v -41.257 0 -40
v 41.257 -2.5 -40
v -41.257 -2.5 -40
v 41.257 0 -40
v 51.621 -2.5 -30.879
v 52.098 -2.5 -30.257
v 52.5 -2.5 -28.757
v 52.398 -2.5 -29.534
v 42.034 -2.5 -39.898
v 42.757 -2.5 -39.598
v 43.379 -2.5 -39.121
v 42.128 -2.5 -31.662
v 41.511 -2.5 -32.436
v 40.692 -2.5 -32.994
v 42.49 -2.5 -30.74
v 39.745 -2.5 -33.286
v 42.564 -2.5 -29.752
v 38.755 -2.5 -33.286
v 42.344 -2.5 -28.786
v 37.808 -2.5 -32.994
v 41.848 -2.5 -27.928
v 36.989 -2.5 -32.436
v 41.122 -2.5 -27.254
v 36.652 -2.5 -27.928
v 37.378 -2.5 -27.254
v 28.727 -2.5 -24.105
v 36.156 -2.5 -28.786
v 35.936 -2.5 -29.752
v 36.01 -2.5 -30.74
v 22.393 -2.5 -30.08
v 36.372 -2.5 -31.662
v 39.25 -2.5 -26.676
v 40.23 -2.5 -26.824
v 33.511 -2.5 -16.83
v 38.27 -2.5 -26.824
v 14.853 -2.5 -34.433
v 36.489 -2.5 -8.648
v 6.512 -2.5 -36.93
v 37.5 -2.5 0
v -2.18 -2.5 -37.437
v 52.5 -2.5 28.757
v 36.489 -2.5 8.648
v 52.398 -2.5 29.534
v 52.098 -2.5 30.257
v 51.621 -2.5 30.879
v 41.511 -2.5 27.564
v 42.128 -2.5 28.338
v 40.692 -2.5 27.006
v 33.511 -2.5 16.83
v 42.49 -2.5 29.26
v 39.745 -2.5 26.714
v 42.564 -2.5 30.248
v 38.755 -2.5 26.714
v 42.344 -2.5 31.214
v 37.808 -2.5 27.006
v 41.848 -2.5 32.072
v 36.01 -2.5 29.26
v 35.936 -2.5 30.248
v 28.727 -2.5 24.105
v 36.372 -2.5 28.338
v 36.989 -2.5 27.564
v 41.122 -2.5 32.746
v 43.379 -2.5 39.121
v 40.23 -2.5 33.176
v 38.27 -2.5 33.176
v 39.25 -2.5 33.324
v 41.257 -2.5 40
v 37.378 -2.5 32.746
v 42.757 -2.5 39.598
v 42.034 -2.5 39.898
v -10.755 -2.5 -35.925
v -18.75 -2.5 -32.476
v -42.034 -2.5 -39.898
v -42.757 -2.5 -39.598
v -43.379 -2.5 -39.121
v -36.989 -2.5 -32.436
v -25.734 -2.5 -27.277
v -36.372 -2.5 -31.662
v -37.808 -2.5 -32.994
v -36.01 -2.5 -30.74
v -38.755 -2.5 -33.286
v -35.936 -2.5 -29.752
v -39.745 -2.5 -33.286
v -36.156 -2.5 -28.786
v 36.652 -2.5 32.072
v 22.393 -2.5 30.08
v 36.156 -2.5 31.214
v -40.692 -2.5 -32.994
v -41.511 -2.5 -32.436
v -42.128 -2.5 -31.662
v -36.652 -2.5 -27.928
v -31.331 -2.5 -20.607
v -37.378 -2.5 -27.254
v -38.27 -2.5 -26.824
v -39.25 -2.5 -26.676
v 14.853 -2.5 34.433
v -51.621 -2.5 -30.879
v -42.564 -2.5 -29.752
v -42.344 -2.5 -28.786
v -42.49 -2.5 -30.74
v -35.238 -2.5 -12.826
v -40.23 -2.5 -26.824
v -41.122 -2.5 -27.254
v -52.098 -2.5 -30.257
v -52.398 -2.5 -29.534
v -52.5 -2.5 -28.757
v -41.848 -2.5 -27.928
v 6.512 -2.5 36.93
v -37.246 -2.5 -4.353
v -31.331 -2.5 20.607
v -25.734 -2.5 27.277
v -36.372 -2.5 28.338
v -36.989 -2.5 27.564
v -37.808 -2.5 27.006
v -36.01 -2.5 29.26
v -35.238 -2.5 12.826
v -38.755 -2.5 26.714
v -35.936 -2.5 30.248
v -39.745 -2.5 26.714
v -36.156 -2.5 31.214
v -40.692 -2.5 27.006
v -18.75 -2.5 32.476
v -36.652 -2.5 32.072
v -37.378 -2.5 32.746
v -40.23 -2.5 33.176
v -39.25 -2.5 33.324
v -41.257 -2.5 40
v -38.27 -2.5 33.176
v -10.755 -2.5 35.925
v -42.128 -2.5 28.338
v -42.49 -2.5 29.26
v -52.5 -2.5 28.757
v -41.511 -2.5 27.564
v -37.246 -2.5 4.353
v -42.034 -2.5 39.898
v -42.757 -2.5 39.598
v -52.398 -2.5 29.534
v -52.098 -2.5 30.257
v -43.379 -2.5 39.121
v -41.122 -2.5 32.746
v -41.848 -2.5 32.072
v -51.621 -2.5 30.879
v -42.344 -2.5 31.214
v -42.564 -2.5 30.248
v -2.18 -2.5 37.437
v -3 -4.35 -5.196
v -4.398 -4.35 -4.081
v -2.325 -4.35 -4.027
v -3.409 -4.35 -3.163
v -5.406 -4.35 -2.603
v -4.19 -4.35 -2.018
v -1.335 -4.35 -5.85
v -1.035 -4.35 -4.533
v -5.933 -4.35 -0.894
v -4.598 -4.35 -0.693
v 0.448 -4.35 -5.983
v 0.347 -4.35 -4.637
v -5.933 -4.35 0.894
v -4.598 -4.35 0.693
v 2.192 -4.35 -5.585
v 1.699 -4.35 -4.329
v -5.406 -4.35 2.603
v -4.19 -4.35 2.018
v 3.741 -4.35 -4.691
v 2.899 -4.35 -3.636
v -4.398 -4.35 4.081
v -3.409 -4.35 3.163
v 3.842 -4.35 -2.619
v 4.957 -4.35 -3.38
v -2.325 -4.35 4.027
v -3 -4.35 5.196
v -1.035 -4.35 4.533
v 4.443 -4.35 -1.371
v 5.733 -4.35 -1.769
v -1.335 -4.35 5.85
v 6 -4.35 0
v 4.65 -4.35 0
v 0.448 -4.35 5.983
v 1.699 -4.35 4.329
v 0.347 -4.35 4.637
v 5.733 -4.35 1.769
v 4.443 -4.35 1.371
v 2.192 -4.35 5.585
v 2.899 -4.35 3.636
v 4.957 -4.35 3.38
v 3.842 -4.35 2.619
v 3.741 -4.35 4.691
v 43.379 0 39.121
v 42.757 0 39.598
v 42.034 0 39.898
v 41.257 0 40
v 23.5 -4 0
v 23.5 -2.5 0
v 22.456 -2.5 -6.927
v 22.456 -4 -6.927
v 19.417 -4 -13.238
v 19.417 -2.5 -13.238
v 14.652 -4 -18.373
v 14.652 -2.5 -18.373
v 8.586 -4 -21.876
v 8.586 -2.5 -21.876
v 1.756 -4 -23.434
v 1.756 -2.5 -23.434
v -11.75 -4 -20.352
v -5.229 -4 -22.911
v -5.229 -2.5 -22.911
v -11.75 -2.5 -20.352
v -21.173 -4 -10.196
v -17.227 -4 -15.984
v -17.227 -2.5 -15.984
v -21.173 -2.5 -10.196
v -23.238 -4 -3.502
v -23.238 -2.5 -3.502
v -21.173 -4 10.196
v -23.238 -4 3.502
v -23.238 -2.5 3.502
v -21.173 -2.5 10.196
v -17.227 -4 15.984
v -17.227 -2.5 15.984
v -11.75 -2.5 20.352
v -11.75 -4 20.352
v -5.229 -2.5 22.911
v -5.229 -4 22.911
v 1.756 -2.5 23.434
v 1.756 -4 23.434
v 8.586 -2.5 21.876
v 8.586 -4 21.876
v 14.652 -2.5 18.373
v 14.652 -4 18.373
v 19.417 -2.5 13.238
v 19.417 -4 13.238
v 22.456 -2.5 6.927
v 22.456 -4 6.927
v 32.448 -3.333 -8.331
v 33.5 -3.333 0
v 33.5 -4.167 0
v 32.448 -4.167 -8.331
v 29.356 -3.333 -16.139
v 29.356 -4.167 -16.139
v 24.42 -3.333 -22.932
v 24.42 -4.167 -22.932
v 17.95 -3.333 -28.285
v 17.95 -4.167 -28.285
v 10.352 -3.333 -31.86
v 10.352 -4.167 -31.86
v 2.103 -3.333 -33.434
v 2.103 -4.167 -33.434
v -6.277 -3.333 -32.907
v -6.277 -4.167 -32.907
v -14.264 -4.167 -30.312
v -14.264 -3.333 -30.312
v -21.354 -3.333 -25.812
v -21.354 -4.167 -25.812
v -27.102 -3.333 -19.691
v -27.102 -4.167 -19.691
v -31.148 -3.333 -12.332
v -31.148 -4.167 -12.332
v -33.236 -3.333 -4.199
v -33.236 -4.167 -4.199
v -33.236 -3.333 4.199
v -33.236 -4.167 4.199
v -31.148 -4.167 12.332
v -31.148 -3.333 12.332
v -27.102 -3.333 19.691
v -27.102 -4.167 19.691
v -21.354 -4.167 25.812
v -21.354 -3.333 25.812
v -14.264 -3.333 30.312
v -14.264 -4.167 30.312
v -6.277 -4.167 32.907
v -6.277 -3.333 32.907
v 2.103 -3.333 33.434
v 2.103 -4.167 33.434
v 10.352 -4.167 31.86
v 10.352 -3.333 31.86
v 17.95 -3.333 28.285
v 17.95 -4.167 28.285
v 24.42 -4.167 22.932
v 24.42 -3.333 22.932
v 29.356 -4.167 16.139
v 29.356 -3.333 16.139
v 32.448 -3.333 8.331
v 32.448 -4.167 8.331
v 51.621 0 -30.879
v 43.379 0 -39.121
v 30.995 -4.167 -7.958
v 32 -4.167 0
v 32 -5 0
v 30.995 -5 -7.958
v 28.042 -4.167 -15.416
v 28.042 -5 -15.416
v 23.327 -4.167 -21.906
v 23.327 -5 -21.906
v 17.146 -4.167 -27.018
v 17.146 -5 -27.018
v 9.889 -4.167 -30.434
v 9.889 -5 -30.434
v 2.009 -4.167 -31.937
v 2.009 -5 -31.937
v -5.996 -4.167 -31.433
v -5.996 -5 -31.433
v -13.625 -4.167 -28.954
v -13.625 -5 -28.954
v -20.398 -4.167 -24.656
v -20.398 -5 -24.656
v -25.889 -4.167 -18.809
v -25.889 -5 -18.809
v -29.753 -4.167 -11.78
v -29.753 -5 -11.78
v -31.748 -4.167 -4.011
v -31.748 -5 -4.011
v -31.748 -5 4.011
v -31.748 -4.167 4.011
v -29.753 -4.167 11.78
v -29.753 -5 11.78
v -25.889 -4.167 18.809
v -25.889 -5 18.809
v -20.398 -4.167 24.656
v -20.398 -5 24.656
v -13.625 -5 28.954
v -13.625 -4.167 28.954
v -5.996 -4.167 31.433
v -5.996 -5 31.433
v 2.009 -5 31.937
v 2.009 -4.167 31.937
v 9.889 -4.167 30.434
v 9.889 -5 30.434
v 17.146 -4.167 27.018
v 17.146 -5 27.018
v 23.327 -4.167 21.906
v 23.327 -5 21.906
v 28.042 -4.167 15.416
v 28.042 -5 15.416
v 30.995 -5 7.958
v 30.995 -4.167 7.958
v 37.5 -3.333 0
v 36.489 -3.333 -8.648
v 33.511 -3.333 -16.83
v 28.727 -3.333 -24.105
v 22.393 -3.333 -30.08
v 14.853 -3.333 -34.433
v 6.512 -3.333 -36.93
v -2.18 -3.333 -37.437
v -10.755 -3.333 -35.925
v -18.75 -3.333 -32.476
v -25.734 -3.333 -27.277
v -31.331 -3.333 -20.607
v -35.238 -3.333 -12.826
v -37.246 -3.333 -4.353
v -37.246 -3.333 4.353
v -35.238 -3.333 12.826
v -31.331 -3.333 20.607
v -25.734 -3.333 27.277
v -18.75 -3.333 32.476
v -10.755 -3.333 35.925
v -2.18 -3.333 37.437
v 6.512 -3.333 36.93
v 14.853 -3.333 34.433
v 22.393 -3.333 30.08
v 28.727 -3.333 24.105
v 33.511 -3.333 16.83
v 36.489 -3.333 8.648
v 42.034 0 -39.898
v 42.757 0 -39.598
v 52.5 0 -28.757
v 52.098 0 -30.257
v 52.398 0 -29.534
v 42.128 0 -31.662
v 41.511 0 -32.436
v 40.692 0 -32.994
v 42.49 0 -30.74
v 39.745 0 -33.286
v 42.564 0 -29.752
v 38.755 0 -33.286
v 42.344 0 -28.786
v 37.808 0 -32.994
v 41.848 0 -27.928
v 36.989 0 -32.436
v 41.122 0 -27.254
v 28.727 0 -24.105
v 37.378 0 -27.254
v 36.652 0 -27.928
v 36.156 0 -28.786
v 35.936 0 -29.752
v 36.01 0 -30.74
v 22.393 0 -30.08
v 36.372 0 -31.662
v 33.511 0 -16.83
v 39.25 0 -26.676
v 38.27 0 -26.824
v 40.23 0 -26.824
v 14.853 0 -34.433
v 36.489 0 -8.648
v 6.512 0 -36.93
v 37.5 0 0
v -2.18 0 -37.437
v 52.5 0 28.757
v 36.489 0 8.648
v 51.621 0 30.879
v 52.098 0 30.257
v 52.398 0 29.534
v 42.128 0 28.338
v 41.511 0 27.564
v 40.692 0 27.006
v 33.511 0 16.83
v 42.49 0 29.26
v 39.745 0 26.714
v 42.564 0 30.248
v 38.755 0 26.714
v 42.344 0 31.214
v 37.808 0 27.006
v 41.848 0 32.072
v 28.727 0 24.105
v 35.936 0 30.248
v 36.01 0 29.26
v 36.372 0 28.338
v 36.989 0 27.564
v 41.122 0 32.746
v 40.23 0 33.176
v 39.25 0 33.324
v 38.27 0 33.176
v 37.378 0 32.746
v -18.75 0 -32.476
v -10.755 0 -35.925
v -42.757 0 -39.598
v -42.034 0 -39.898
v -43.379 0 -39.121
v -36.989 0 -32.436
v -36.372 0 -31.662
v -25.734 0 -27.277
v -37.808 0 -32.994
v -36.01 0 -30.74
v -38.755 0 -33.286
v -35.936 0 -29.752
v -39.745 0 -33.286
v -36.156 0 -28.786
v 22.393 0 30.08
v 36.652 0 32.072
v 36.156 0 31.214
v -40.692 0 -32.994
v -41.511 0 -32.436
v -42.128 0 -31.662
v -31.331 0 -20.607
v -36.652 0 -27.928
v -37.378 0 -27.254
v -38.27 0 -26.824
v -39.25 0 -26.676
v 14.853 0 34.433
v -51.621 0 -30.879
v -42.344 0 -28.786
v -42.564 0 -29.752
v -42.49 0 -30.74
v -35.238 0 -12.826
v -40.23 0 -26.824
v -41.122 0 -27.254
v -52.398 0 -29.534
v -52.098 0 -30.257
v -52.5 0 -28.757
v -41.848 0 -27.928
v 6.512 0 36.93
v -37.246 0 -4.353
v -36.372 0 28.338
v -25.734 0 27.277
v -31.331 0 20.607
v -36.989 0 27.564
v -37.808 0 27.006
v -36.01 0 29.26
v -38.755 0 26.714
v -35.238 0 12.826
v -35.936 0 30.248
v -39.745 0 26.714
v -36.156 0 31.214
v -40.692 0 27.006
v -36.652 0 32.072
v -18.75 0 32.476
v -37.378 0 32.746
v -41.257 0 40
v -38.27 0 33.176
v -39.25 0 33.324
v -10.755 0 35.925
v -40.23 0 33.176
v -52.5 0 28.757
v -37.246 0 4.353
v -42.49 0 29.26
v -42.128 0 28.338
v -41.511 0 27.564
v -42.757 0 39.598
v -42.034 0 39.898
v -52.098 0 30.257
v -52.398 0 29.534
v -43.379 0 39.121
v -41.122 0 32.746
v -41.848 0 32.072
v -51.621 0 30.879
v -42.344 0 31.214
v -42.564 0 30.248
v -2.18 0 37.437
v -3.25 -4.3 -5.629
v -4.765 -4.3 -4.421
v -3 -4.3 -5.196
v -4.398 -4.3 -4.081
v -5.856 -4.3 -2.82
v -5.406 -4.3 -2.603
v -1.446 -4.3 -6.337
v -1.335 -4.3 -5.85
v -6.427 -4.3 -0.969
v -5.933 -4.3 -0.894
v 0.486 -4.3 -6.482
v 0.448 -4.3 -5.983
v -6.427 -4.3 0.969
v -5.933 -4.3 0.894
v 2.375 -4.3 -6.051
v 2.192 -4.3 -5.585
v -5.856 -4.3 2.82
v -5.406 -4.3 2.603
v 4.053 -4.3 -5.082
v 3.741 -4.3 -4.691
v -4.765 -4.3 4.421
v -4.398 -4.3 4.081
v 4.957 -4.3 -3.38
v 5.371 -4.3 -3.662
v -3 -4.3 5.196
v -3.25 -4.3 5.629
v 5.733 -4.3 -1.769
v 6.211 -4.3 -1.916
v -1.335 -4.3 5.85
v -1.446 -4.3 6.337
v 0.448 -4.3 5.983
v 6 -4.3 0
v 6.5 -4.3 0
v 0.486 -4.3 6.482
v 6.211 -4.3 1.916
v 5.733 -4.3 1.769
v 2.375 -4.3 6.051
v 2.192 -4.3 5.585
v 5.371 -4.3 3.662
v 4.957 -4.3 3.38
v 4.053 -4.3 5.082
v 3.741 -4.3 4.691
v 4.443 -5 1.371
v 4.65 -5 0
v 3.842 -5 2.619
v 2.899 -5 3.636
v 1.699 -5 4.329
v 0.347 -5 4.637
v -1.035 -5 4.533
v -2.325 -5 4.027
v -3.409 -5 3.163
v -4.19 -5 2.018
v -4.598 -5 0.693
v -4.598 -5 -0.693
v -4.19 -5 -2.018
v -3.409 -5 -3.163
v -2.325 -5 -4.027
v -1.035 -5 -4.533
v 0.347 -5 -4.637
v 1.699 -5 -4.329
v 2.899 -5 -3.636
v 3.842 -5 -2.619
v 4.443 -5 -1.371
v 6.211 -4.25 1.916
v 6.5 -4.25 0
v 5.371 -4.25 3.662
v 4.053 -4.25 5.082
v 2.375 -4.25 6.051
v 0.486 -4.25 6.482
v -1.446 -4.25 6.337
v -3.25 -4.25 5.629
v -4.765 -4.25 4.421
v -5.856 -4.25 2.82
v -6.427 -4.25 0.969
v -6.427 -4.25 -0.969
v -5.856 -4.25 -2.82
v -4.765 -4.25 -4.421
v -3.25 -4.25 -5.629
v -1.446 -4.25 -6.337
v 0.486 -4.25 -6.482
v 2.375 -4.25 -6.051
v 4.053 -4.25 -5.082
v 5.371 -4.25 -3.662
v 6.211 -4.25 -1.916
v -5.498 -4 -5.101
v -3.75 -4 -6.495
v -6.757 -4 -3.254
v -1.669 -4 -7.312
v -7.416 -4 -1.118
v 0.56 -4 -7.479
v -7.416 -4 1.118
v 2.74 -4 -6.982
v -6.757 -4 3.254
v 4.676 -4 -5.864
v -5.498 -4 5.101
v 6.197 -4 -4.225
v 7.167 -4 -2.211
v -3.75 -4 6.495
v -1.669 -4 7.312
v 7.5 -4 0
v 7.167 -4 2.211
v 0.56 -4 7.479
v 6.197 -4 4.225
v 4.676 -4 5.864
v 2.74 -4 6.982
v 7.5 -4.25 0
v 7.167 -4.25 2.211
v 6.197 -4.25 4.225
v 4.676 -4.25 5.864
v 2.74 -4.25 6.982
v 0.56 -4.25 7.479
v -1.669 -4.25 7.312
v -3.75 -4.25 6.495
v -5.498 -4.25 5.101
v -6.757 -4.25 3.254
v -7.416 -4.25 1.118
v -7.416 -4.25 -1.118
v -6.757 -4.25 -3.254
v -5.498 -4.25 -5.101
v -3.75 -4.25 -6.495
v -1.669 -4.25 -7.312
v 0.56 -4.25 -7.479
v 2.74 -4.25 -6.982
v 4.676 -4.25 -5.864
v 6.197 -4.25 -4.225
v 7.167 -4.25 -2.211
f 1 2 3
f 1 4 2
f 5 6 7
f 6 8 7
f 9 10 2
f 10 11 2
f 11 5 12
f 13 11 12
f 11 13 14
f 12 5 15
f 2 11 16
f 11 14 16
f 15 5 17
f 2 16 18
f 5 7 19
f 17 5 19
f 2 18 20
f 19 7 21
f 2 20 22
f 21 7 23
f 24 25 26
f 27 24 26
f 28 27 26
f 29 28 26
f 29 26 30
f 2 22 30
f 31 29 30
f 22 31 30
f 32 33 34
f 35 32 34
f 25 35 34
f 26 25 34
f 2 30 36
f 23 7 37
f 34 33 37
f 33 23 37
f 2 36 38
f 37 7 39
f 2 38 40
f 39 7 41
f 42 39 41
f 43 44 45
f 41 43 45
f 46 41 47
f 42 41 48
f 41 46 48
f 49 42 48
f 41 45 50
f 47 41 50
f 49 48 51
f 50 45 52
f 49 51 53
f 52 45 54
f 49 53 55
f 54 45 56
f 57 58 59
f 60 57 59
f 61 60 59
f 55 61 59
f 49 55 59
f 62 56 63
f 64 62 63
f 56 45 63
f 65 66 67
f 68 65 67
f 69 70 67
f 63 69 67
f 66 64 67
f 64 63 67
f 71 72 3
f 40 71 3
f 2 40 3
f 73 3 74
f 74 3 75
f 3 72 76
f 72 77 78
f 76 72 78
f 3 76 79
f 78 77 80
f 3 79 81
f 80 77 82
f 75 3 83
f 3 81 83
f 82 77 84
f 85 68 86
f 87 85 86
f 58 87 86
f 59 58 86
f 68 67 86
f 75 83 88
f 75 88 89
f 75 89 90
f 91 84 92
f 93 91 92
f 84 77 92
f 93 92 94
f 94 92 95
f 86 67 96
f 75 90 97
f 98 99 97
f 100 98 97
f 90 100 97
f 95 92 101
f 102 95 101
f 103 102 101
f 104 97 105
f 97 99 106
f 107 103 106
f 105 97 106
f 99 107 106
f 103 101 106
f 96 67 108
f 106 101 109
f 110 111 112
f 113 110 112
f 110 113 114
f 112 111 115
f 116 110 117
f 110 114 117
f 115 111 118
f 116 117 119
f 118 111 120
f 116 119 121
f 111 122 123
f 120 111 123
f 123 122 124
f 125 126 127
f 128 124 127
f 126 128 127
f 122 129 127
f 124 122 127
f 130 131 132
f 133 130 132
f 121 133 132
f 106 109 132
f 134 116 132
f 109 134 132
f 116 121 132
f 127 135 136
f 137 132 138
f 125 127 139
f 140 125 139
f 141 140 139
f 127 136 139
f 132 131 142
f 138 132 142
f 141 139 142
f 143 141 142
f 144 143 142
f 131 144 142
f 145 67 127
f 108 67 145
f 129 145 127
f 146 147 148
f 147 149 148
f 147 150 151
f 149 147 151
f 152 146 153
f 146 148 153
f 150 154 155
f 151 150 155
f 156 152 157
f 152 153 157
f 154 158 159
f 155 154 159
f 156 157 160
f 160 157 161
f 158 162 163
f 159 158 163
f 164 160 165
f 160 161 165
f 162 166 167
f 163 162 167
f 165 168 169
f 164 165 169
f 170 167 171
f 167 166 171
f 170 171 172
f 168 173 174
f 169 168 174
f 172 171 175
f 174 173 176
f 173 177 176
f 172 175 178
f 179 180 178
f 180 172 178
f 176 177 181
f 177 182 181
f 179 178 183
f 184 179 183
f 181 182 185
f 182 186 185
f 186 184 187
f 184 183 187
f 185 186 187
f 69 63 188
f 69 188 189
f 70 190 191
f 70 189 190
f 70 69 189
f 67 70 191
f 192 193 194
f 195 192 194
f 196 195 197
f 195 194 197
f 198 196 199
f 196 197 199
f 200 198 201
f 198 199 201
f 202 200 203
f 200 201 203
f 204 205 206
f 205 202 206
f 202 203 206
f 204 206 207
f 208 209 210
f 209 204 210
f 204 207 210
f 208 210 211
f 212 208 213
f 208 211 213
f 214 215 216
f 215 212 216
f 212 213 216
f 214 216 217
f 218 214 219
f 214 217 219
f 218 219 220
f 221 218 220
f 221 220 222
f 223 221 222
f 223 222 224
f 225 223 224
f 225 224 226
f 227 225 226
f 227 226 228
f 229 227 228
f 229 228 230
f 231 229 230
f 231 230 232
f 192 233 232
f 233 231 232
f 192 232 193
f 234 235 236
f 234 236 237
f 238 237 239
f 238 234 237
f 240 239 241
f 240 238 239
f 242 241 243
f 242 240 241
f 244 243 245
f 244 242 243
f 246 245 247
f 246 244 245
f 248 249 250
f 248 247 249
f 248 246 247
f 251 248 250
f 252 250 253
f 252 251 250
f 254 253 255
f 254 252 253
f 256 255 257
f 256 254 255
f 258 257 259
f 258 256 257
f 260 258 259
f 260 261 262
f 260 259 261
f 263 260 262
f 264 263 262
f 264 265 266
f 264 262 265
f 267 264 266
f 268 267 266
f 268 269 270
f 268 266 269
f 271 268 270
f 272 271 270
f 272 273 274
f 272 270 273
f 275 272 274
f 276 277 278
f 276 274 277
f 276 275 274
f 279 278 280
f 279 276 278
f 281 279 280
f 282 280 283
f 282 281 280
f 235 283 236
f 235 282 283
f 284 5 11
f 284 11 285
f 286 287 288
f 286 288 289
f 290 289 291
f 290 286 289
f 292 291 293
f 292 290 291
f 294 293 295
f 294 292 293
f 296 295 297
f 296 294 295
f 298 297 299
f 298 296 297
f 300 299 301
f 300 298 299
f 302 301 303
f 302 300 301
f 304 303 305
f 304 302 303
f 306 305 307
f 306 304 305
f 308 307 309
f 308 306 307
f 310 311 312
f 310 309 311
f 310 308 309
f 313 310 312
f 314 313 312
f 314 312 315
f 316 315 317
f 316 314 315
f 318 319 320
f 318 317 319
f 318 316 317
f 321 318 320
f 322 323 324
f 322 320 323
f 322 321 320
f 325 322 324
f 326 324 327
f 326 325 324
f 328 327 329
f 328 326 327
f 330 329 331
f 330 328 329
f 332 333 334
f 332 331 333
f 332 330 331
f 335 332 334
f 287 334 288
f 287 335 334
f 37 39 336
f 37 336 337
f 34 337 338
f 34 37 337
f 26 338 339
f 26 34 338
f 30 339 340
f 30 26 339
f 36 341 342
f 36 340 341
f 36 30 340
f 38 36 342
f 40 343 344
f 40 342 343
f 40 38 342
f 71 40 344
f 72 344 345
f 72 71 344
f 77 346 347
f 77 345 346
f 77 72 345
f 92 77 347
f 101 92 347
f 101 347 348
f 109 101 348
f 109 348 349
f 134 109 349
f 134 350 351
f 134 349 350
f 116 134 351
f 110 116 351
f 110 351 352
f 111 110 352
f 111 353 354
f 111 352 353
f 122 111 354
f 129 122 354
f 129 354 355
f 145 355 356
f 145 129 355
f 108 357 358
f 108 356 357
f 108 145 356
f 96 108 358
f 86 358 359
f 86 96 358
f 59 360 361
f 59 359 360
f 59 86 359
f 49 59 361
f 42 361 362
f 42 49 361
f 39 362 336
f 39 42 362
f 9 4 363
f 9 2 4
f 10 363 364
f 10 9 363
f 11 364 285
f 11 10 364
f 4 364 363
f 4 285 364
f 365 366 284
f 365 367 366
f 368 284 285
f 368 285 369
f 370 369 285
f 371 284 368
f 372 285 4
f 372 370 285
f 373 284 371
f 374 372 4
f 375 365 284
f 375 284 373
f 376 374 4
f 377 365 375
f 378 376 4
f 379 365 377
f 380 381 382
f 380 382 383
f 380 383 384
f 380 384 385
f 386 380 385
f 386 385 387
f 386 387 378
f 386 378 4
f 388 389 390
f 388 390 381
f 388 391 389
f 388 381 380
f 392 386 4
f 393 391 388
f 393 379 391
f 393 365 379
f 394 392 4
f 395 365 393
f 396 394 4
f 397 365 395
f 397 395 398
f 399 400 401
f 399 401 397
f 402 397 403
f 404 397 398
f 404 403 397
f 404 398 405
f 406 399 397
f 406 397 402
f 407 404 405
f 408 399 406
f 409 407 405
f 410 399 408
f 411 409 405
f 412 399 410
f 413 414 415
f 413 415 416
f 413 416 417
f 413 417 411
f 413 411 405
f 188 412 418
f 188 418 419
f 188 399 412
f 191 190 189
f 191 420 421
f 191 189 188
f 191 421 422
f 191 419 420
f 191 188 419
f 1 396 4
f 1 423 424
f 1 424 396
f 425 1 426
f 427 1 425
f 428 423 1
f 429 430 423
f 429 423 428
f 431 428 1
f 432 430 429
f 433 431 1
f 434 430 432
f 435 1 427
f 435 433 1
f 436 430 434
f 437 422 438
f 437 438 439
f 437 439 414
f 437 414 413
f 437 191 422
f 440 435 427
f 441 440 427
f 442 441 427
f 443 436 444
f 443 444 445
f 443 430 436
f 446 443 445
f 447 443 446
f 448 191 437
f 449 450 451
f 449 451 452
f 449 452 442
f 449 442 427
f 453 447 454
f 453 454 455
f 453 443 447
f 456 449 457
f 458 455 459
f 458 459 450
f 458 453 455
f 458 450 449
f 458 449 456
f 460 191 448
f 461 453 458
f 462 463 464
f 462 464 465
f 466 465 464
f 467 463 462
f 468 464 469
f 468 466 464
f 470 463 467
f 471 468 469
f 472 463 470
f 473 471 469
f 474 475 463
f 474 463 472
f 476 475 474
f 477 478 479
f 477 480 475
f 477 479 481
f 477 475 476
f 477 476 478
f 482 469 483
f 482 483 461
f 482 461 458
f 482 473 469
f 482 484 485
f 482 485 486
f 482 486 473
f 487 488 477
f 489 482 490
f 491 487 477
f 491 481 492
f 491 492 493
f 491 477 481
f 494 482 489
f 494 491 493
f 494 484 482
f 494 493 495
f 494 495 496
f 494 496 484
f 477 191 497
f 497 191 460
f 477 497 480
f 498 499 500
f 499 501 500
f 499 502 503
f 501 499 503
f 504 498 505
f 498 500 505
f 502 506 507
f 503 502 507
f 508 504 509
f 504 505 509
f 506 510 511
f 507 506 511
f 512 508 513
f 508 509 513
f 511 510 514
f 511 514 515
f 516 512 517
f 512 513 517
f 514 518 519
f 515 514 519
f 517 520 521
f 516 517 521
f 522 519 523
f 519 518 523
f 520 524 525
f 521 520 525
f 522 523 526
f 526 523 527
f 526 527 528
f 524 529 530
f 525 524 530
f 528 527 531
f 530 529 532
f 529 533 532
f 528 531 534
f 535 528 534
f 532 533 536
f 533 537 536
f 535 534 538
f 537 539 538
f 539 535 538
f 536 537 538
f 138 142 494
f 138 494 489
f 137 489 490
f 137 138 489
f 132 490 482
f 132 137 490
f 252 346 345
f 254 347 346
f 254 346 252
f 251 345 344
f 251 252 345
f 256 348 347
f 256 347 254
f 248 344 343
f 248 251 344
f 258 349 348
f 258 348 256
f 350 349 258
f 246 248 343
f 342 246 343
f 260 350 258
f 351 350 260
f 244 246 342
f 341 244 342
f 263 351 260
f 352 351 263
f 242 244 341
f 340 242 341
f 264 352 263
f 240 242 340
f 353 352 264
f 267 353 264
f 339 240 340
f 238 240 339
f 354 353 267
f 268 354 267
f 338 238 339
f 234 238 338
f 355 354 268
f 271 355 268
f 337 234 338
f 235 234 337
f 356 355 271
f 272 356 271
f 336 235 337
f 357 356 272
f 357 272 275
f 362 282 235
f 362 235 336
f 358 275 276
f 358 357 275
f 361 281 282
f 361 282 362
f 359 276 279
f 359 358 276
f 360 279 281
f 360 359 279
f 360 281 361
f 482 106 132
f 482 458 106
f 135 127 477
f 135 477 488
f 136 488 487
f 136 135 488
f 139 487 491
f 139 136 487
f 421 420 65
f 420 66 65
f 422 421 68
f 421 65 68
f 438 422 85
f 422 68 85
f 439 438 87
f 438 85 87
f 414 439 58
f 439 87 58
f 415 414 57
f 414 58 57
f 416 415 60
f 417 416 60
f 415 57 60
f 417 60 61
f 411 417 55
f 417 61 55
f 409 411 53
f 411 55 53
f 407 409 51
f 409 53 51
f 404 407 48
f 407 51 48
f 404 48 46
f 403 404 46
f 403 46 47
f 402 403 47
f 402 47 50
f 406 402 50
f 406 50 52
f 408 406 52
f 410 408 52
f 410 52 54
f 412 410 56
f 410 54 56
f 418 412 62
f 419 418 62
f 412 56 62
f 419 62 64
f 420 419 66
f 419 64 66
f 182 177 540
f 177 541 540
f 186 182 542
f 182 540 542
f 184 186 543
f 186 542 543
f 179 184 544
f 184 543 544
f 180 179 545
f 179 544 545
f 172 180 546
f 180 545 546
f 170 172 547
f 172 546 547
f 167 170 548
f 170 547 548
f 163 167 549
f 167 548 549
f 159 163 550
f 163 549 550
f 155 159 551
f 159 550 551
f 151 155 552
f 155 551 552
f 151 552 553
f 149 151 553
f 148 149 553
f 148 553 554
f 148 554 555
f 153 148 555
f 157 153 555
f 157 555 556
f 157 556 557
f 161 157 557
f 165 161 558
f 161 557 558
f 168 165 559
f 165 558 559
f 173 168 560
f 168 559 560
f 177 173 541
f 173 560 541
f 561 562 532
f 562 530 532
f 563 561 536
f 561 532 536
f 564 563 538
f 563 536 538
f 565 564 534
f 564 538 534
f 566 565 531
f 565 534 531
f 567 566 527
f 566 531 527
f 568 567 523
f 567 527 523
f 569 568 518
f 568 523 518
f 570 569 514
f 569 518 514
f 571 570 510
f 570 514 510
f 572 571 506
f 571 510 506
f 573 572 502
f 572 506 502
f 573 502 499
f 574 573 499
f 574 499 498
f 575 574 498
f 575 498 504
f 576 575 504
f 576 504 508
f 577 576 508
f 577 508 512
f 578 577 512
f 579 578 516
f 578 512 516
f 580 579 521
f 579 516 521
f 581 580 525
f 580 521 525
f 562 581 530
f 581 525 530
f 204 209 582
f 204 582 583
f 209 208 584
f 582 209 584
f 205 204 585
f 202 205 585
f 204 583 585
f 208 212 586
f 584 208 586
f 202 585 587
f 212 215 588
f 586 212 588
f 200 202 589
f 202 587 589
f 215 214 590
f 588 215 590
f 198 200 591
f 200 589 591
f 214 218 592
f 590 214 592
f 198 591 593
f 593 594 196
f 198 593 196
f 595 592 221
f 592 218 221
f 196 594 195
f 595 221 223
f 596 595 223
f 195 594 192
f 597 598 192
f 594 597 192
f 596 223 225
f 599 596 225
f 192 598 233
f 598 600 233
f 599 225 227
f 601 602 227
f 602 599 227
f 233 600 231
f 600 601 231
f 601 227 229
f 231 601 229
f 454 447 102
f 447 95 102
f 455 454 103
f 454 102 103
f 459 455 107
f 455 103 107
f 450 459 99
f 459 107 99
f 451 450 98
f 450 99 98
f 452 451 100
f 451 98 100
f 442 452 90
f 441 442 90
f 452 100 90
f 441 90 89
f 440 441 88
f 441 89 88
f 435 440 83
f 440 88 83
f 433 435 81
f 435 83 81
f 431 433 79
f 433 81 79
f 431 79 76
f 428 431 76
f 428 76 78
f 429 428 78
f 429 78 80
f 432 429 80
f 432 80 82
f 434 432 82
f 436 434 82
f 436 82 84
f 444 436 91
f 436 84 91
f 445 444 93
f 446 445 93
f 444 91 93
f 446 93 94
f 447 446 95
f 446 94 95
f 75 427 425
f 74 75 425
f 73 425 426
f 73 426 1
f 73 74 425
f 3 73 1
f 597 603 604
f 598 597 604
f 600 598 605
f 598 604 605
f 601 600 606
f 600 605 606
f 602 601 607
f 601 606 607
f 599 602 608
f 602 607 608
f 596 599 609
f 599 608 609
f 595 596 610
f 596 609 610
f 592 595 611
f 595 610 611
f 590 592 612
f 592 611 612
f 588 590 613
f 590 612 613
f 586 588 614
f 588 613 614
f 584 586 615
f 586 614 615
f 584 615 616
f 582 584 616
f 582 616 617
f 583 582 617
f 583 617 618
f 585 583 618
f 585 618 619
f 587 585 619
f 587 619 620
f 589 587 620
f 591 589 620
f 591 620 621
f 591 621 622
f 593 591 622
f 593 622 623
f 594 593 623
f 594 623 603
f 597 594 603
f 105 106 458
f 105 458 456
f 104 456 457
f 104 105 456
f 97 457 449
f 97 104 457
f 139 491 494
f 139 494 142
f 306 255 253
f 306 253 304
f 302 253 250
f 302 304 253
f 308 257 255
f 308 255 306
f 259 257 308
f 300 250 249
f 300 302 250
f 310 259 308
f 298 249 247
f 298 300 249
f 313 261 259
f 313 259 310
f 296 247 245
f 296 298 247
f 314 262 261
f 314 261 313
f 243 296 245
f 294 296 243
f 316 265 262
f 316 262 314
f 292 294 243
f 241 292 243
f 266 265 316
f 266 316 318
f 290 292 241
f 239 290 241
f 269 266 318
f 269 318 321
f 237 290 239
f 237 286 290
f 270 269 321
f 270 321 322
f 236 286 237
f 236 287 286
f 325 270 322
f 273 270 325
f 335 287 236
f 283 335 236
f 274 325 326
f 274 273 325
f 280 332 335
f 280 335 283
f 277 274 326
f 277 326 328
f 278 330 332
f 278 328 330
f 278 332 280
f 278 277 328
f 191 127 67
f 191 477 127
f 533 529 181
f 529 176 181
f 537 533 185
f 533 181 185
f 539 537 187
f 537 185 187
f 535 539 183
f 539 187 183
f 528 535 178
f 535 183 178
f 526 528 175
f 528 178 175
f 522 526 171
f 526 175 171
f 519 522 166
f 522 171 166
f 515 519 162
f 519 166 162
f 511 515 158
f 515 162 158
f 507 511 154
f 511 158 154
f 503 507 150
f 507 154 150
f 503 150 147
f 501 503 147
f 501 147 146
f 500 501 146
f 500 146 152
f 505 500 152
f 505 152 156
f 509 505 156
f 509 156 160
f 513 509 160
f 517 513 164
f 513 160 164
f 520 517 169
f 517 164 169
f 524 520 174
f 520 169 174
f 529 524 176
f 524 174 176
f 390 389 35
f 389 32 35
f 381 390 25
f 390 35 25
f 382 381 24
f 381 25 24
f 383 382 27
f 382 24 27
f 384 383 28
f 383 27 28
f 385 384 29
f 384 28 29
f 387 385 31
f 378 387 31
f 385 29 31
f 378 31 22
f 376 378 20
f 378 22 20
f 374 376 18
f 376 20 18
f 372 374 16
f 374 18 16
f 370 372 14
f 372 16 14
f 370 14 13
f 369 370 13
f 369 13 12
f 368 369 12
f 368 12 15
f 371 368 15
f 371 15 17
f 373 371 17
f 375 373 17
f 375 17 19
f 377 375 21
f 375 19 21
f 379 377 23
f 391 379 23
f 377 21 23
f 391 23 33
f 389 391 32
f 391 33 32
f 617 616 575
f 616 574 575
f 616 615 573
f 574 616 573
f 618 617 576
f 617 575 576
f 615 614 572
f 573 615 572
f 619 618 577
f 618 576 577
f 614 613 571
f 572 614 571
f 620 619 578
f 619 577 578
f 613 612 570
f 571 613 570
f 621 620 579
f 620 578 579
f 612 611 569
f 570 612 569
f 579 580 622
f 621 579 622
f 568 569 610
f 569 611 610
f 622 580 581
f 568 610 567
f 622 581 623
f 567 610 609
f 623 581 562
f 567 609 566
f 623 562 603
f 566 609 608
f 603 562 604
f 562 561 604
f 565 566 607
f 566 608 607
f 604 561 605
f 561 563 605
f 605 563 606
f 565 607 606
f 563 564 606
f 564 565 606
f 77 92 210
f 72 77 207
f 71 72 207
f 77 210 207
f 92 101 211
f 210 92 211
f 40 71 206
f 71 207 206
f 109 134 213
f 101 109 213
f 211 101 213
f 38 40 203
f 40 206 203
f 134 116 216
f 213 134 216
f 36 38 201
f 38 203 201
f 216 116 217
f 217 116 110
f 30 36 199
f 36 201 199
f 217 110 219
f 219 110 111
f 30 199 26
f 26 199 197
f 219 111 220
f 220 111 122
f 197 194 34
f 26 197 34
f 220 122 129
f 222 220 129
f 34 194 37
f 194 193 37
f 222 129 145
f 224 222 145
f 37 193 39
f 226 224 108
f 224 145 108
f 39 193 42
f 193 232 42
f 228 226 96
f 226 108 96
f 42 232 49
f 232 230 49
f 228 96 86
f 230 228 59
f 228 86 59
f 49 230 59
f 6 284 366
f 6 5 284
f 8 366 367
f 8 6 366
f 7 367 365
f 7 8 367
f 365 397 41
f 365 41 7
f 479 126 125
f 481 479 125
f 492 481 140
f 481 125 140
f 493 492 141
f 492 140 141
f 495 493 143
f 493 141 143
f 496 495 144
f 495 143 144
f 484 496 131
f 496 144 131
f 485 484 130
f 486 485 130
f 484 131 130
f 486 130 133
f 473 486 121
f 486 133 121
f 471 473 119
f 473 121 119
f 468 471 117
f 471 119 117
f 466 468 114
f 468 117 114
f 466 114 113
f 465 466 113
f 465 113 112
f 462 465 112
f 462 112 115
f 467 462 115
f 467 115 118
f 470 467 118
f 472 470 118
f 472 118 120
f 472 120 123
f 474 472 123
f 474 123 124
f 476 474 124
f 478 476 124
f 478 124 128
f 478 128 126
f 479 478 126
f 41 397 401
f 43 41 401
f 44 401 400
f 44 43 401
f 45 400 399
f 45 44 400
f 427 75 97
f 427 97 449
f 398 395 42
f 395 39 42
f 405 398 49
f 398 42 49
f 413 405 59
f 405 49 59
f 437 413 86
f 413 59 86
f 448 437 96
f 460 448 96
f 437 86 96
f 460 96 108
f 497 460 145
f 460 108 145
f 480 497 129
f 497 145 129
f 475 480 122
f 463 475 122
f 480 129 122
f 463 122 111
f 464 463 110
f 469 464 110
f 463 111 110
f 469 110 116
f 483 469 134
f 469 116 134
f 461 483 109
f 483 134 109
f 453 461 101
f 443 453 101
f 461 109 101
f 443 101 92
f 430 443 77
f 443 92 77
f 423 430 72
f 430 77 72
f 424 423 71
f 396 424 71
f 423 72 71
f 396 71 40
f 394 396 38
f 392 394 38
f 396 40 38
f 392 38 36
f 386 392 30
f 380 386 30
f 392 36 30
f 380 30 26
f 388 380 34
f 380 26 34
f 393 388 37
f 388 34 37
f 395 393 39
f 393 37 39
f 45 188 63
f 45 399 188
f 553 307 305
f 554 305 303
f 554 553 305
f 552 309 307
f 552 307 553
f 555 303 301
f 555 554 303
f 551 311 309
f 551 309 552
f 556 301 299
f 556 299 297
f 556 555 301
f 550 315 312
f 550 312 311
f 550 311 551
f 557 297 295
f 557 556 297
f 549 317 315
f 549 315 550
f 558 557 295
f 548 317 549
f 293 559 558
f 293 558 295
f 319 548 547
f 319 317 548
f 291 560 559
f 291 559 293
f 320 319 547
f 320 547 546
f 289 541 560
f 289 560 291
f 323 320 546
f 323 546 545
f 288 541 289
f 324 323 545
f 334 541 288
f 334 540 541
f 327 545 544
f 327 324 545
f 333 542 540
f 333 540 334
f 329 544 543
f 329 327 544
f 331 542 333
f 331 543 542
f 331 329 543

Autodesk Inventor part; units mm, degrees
ref_plane "YZ Plane" through (0, 0, 0) normal (1, 0, 0) x (0, 1, 0)
ref_plane "XZ Plane" through (0, 0, 0) normal (0, 1, 0) x (-1, 0, 0)
ref_plane "XY Plane" through (0, 0, 0) normal (0, 0, 1) x (1, 0, 0)
sketch "Skizze1" plane through (0, 0, 0) normal (0, 1, 0) x (-1, 0, 0)
  line L0 (52.5, 40) -> (-52.5, 40)
  line L1 (-52.5, 40) -> (-52.5, -40)
  line L2 (-52.5, -40) -> (52.5, -40)
  line L3 (52.5, -40) -> (52.5, 40)
  line L4 (0, -56) -> (0, 56) construction
  line L5 (73.5, 0) -> (-73.5, 0) construction
  point P0 (0, 0)
  point P1 (-39.25, -30)
  point P2 (-39.25, 30)
  point P3 (39.25, -30)
  point P4 (39.25, 30)
  dimension "d0" = 105
  dimension "d1" = 80
  dimension "d2" = 39.25
  dimension "d3" = 30
extrude "Extrusion1" add sketch "Skizze1" against normal blind 2.5
hole "Bohrung1" at (39.25, 0, -30) at (39.25, 0, 30) at (-39.25, 0, 30) at (-39.25, 0, -30) direction (0, -1, 0) diameter 6.647 depth 14 tip angle 118 thread size "M8x1.25" class "6H" standard "ISO Metric profile"
chamfer "Fasen1" distance 10 angle 45 4 edges at (52.5, -1.25, 40) (52.5, -1.25, -40) (-52.5, -1.25, -40) (-52.5, -1.25, 40)
fillet "Rundung1" radius 3 8 edges at (-42.5, -1.25, 40) (-52.5, -1.25, 30) (-52.5, -1.25, -30) (-42.5, -1.25, -40) (42.5, -1.25, -40) (52.5, -1.25, -30) (42.5, -1.25, 40) (52.5, -1.25, 30)
sketch "Skizze2" plane through (0, -2.5, 0) normal (0, -1, 0) x (1, 0, 0)
  circle A0 centre (0, 0) radius 37.5
  circle A1 centre (0, 0) radius 34
  circle A2 centre (0, 0) radius 33.5
  circle A3 centre (0, 0) radius 32
  circle A4 centre (0, 0) radius 25
  circle A5 centre (0, 0) radius 23.5
  circle A6 centre (0, 0) radius 7.5
  circle A7 centre (0, 0) radius 6.5
  circle A8 centre (0, 0) radius 6
  circle A9 centre (0, 0) radius 4.5
  dimension "d17" = 75
  dimension "d18" = 68
  dimension "d19" = 67
  dimension "d20" = 64
  dimension "d21" = 50
  dimension "d22" = 47
  dimension "d23" = 15
  dimension "d24" = 13
  dimension "d25" = 12
  dimension "d26" = 9
extrude "Extrusion2" cut sketch "Skizze2" against normal blind 2.5 contours A0 | A1 | A2 | A3 | A4 | A5 | A6 | A7 | A8 | A9
extrude "Extrusion3" add sketch "Skizze2" along normal blind 0.8333 contours A0 | A1
extrude "Extrusion5" add sketch "Skizze2" along normal blind 1.6666 contours A2
extrude "Extrusion6" add sketch "Skizze2" along normal blind 2.5 contours A3 | A4
sketch "Skizze3" plane through (0, -5, 0) normal (0, -1, 0) x (1, 0, 0)
  circle A0 centre (0, 0) radius 23.5 construction
  circle A1 centre (0, 0) radius 4.5
  circle A2 centre (0, 0) radius 6
  circle A3 centre (0, 0) radius 6.5
  circle A4 centre (0, 0) radius 7.5
  circle A5 centre (0, 0) radius 23.5
  circle A6 centre (0, 0) radius 32 construction
  circle A7 centre (0, 0) radius 4.65
  dimension "d37" = 9
  dimension "d38" = 12
  dimension "d39" = 13
  dimension "d40" = 15
  dimension "d47" = 9.3
extrude "Extrusion7" add sketch "Skizze3" against normal blind 1 contours A5
extrude "Extrusion8" add sketch "Skizze3" against normal blind 0.75 contours A4
extrude "Extrusion9" add sketch "Skizze3" against normal blind 0.7 contours A3
extrude "Extrusion10" add sketch "Skizze3" against normal blind 0.65 contours A2
sketch "Skizze4" plane through (-52.5, 0, -28.7574) normal (-1, 0, 0) x (0, 0, 1)
  line L0 (0, -2.5) -> (0, 0) construction
  line L1 (57.5147, -2.5) -> (0, -2.5) construction
  line L2 (57.5147, 0) -> (57.5147, -2.5) construction
  line L3 (0, 0) -> (57.5147, 0) construction
  line L4 (-3.2426, -5) -> (60.7574, -5) construction
  point P0 (28.7574, 0)
  dimension "d53" = 2.5
  dimension "d54" = 5
sketch "Skizze5" plane through (0, 0, 0) normal (0, 1, 0) x (1, 0, 0)
  circle A0 centre (0, 0) radius 37.5 construction
  arc A1 (51.6213, -30.8787) -> (52.5, -28.7574) centre (49.5, -28.7574) ccw construction
  line L0 (52.5, -28.7574) -> (52.5, 28.7574) construction
  arc A2 (52.5, 28.7574) -> (51.6213, 30.8787) centre (49.5, 28.7574) ccw construction
  line L1 (43.3787, 39.1213) -> (51.6213, 30.8787) construction
  arc A3 (43.3787, 39.1213) -> (41.2574, 40) centre (41.2574, 37) ccw construction
  line L2 (41.2574, 40) -> (-41.2574, 40) construction
  arc A4 (-41.2574, 40) -> (-43.3787, 39.1213) centre (-41.2574, 37) ccw construction
  line L3 (-51.6213, 30.8787) -> (-43.3787, 39.1213) construction
  arc A5 (-51.6213, 30.8787) -> (-52.5, 28.7574) centre (-49.5, 28.7574) ccw construction
  line L4 (-52.5, 28.7574) -> (-52.5, -28.7574) construction
  arc A6 (-52.5, -28.7574) -> (-51.6213, -30.8787) centre (-49.5, -28.7574) ccw construction
  line L5 (-43.3787, -39.1213) -> (-51.6213, -30.8787) construction
  arc A7 (-43.3787, -39.1213) -> (-41.2574, -40) centre (-41.2574, -37) ccw construction
  line L6 (-41.2574, -40) -> (41.2574, -40) construction
  arc A8 (41.2574, -40) -> (43.3787, -39.1213) centre (41.2574, -37) ccw construction
  line L7 (51.6213, -30.8787) -> (43.3787, -39.1213) construction
  circle A9 centre (39.25, 30) radius 3.3235 construction
  circle A10 centre (39.25, -30) radius 3.3235 construction
  circle A11 centre (-39.25, -30) radius 3.3235 construction
  circle A12 centre (-39.25, 30) radius 3.3235 construction
  line L8 (39.25, -30) -> (0, -30)
  line L9 (0, -30) -> (0, 0)
properties part number "oberer_Rotierkörper_Rolle"
